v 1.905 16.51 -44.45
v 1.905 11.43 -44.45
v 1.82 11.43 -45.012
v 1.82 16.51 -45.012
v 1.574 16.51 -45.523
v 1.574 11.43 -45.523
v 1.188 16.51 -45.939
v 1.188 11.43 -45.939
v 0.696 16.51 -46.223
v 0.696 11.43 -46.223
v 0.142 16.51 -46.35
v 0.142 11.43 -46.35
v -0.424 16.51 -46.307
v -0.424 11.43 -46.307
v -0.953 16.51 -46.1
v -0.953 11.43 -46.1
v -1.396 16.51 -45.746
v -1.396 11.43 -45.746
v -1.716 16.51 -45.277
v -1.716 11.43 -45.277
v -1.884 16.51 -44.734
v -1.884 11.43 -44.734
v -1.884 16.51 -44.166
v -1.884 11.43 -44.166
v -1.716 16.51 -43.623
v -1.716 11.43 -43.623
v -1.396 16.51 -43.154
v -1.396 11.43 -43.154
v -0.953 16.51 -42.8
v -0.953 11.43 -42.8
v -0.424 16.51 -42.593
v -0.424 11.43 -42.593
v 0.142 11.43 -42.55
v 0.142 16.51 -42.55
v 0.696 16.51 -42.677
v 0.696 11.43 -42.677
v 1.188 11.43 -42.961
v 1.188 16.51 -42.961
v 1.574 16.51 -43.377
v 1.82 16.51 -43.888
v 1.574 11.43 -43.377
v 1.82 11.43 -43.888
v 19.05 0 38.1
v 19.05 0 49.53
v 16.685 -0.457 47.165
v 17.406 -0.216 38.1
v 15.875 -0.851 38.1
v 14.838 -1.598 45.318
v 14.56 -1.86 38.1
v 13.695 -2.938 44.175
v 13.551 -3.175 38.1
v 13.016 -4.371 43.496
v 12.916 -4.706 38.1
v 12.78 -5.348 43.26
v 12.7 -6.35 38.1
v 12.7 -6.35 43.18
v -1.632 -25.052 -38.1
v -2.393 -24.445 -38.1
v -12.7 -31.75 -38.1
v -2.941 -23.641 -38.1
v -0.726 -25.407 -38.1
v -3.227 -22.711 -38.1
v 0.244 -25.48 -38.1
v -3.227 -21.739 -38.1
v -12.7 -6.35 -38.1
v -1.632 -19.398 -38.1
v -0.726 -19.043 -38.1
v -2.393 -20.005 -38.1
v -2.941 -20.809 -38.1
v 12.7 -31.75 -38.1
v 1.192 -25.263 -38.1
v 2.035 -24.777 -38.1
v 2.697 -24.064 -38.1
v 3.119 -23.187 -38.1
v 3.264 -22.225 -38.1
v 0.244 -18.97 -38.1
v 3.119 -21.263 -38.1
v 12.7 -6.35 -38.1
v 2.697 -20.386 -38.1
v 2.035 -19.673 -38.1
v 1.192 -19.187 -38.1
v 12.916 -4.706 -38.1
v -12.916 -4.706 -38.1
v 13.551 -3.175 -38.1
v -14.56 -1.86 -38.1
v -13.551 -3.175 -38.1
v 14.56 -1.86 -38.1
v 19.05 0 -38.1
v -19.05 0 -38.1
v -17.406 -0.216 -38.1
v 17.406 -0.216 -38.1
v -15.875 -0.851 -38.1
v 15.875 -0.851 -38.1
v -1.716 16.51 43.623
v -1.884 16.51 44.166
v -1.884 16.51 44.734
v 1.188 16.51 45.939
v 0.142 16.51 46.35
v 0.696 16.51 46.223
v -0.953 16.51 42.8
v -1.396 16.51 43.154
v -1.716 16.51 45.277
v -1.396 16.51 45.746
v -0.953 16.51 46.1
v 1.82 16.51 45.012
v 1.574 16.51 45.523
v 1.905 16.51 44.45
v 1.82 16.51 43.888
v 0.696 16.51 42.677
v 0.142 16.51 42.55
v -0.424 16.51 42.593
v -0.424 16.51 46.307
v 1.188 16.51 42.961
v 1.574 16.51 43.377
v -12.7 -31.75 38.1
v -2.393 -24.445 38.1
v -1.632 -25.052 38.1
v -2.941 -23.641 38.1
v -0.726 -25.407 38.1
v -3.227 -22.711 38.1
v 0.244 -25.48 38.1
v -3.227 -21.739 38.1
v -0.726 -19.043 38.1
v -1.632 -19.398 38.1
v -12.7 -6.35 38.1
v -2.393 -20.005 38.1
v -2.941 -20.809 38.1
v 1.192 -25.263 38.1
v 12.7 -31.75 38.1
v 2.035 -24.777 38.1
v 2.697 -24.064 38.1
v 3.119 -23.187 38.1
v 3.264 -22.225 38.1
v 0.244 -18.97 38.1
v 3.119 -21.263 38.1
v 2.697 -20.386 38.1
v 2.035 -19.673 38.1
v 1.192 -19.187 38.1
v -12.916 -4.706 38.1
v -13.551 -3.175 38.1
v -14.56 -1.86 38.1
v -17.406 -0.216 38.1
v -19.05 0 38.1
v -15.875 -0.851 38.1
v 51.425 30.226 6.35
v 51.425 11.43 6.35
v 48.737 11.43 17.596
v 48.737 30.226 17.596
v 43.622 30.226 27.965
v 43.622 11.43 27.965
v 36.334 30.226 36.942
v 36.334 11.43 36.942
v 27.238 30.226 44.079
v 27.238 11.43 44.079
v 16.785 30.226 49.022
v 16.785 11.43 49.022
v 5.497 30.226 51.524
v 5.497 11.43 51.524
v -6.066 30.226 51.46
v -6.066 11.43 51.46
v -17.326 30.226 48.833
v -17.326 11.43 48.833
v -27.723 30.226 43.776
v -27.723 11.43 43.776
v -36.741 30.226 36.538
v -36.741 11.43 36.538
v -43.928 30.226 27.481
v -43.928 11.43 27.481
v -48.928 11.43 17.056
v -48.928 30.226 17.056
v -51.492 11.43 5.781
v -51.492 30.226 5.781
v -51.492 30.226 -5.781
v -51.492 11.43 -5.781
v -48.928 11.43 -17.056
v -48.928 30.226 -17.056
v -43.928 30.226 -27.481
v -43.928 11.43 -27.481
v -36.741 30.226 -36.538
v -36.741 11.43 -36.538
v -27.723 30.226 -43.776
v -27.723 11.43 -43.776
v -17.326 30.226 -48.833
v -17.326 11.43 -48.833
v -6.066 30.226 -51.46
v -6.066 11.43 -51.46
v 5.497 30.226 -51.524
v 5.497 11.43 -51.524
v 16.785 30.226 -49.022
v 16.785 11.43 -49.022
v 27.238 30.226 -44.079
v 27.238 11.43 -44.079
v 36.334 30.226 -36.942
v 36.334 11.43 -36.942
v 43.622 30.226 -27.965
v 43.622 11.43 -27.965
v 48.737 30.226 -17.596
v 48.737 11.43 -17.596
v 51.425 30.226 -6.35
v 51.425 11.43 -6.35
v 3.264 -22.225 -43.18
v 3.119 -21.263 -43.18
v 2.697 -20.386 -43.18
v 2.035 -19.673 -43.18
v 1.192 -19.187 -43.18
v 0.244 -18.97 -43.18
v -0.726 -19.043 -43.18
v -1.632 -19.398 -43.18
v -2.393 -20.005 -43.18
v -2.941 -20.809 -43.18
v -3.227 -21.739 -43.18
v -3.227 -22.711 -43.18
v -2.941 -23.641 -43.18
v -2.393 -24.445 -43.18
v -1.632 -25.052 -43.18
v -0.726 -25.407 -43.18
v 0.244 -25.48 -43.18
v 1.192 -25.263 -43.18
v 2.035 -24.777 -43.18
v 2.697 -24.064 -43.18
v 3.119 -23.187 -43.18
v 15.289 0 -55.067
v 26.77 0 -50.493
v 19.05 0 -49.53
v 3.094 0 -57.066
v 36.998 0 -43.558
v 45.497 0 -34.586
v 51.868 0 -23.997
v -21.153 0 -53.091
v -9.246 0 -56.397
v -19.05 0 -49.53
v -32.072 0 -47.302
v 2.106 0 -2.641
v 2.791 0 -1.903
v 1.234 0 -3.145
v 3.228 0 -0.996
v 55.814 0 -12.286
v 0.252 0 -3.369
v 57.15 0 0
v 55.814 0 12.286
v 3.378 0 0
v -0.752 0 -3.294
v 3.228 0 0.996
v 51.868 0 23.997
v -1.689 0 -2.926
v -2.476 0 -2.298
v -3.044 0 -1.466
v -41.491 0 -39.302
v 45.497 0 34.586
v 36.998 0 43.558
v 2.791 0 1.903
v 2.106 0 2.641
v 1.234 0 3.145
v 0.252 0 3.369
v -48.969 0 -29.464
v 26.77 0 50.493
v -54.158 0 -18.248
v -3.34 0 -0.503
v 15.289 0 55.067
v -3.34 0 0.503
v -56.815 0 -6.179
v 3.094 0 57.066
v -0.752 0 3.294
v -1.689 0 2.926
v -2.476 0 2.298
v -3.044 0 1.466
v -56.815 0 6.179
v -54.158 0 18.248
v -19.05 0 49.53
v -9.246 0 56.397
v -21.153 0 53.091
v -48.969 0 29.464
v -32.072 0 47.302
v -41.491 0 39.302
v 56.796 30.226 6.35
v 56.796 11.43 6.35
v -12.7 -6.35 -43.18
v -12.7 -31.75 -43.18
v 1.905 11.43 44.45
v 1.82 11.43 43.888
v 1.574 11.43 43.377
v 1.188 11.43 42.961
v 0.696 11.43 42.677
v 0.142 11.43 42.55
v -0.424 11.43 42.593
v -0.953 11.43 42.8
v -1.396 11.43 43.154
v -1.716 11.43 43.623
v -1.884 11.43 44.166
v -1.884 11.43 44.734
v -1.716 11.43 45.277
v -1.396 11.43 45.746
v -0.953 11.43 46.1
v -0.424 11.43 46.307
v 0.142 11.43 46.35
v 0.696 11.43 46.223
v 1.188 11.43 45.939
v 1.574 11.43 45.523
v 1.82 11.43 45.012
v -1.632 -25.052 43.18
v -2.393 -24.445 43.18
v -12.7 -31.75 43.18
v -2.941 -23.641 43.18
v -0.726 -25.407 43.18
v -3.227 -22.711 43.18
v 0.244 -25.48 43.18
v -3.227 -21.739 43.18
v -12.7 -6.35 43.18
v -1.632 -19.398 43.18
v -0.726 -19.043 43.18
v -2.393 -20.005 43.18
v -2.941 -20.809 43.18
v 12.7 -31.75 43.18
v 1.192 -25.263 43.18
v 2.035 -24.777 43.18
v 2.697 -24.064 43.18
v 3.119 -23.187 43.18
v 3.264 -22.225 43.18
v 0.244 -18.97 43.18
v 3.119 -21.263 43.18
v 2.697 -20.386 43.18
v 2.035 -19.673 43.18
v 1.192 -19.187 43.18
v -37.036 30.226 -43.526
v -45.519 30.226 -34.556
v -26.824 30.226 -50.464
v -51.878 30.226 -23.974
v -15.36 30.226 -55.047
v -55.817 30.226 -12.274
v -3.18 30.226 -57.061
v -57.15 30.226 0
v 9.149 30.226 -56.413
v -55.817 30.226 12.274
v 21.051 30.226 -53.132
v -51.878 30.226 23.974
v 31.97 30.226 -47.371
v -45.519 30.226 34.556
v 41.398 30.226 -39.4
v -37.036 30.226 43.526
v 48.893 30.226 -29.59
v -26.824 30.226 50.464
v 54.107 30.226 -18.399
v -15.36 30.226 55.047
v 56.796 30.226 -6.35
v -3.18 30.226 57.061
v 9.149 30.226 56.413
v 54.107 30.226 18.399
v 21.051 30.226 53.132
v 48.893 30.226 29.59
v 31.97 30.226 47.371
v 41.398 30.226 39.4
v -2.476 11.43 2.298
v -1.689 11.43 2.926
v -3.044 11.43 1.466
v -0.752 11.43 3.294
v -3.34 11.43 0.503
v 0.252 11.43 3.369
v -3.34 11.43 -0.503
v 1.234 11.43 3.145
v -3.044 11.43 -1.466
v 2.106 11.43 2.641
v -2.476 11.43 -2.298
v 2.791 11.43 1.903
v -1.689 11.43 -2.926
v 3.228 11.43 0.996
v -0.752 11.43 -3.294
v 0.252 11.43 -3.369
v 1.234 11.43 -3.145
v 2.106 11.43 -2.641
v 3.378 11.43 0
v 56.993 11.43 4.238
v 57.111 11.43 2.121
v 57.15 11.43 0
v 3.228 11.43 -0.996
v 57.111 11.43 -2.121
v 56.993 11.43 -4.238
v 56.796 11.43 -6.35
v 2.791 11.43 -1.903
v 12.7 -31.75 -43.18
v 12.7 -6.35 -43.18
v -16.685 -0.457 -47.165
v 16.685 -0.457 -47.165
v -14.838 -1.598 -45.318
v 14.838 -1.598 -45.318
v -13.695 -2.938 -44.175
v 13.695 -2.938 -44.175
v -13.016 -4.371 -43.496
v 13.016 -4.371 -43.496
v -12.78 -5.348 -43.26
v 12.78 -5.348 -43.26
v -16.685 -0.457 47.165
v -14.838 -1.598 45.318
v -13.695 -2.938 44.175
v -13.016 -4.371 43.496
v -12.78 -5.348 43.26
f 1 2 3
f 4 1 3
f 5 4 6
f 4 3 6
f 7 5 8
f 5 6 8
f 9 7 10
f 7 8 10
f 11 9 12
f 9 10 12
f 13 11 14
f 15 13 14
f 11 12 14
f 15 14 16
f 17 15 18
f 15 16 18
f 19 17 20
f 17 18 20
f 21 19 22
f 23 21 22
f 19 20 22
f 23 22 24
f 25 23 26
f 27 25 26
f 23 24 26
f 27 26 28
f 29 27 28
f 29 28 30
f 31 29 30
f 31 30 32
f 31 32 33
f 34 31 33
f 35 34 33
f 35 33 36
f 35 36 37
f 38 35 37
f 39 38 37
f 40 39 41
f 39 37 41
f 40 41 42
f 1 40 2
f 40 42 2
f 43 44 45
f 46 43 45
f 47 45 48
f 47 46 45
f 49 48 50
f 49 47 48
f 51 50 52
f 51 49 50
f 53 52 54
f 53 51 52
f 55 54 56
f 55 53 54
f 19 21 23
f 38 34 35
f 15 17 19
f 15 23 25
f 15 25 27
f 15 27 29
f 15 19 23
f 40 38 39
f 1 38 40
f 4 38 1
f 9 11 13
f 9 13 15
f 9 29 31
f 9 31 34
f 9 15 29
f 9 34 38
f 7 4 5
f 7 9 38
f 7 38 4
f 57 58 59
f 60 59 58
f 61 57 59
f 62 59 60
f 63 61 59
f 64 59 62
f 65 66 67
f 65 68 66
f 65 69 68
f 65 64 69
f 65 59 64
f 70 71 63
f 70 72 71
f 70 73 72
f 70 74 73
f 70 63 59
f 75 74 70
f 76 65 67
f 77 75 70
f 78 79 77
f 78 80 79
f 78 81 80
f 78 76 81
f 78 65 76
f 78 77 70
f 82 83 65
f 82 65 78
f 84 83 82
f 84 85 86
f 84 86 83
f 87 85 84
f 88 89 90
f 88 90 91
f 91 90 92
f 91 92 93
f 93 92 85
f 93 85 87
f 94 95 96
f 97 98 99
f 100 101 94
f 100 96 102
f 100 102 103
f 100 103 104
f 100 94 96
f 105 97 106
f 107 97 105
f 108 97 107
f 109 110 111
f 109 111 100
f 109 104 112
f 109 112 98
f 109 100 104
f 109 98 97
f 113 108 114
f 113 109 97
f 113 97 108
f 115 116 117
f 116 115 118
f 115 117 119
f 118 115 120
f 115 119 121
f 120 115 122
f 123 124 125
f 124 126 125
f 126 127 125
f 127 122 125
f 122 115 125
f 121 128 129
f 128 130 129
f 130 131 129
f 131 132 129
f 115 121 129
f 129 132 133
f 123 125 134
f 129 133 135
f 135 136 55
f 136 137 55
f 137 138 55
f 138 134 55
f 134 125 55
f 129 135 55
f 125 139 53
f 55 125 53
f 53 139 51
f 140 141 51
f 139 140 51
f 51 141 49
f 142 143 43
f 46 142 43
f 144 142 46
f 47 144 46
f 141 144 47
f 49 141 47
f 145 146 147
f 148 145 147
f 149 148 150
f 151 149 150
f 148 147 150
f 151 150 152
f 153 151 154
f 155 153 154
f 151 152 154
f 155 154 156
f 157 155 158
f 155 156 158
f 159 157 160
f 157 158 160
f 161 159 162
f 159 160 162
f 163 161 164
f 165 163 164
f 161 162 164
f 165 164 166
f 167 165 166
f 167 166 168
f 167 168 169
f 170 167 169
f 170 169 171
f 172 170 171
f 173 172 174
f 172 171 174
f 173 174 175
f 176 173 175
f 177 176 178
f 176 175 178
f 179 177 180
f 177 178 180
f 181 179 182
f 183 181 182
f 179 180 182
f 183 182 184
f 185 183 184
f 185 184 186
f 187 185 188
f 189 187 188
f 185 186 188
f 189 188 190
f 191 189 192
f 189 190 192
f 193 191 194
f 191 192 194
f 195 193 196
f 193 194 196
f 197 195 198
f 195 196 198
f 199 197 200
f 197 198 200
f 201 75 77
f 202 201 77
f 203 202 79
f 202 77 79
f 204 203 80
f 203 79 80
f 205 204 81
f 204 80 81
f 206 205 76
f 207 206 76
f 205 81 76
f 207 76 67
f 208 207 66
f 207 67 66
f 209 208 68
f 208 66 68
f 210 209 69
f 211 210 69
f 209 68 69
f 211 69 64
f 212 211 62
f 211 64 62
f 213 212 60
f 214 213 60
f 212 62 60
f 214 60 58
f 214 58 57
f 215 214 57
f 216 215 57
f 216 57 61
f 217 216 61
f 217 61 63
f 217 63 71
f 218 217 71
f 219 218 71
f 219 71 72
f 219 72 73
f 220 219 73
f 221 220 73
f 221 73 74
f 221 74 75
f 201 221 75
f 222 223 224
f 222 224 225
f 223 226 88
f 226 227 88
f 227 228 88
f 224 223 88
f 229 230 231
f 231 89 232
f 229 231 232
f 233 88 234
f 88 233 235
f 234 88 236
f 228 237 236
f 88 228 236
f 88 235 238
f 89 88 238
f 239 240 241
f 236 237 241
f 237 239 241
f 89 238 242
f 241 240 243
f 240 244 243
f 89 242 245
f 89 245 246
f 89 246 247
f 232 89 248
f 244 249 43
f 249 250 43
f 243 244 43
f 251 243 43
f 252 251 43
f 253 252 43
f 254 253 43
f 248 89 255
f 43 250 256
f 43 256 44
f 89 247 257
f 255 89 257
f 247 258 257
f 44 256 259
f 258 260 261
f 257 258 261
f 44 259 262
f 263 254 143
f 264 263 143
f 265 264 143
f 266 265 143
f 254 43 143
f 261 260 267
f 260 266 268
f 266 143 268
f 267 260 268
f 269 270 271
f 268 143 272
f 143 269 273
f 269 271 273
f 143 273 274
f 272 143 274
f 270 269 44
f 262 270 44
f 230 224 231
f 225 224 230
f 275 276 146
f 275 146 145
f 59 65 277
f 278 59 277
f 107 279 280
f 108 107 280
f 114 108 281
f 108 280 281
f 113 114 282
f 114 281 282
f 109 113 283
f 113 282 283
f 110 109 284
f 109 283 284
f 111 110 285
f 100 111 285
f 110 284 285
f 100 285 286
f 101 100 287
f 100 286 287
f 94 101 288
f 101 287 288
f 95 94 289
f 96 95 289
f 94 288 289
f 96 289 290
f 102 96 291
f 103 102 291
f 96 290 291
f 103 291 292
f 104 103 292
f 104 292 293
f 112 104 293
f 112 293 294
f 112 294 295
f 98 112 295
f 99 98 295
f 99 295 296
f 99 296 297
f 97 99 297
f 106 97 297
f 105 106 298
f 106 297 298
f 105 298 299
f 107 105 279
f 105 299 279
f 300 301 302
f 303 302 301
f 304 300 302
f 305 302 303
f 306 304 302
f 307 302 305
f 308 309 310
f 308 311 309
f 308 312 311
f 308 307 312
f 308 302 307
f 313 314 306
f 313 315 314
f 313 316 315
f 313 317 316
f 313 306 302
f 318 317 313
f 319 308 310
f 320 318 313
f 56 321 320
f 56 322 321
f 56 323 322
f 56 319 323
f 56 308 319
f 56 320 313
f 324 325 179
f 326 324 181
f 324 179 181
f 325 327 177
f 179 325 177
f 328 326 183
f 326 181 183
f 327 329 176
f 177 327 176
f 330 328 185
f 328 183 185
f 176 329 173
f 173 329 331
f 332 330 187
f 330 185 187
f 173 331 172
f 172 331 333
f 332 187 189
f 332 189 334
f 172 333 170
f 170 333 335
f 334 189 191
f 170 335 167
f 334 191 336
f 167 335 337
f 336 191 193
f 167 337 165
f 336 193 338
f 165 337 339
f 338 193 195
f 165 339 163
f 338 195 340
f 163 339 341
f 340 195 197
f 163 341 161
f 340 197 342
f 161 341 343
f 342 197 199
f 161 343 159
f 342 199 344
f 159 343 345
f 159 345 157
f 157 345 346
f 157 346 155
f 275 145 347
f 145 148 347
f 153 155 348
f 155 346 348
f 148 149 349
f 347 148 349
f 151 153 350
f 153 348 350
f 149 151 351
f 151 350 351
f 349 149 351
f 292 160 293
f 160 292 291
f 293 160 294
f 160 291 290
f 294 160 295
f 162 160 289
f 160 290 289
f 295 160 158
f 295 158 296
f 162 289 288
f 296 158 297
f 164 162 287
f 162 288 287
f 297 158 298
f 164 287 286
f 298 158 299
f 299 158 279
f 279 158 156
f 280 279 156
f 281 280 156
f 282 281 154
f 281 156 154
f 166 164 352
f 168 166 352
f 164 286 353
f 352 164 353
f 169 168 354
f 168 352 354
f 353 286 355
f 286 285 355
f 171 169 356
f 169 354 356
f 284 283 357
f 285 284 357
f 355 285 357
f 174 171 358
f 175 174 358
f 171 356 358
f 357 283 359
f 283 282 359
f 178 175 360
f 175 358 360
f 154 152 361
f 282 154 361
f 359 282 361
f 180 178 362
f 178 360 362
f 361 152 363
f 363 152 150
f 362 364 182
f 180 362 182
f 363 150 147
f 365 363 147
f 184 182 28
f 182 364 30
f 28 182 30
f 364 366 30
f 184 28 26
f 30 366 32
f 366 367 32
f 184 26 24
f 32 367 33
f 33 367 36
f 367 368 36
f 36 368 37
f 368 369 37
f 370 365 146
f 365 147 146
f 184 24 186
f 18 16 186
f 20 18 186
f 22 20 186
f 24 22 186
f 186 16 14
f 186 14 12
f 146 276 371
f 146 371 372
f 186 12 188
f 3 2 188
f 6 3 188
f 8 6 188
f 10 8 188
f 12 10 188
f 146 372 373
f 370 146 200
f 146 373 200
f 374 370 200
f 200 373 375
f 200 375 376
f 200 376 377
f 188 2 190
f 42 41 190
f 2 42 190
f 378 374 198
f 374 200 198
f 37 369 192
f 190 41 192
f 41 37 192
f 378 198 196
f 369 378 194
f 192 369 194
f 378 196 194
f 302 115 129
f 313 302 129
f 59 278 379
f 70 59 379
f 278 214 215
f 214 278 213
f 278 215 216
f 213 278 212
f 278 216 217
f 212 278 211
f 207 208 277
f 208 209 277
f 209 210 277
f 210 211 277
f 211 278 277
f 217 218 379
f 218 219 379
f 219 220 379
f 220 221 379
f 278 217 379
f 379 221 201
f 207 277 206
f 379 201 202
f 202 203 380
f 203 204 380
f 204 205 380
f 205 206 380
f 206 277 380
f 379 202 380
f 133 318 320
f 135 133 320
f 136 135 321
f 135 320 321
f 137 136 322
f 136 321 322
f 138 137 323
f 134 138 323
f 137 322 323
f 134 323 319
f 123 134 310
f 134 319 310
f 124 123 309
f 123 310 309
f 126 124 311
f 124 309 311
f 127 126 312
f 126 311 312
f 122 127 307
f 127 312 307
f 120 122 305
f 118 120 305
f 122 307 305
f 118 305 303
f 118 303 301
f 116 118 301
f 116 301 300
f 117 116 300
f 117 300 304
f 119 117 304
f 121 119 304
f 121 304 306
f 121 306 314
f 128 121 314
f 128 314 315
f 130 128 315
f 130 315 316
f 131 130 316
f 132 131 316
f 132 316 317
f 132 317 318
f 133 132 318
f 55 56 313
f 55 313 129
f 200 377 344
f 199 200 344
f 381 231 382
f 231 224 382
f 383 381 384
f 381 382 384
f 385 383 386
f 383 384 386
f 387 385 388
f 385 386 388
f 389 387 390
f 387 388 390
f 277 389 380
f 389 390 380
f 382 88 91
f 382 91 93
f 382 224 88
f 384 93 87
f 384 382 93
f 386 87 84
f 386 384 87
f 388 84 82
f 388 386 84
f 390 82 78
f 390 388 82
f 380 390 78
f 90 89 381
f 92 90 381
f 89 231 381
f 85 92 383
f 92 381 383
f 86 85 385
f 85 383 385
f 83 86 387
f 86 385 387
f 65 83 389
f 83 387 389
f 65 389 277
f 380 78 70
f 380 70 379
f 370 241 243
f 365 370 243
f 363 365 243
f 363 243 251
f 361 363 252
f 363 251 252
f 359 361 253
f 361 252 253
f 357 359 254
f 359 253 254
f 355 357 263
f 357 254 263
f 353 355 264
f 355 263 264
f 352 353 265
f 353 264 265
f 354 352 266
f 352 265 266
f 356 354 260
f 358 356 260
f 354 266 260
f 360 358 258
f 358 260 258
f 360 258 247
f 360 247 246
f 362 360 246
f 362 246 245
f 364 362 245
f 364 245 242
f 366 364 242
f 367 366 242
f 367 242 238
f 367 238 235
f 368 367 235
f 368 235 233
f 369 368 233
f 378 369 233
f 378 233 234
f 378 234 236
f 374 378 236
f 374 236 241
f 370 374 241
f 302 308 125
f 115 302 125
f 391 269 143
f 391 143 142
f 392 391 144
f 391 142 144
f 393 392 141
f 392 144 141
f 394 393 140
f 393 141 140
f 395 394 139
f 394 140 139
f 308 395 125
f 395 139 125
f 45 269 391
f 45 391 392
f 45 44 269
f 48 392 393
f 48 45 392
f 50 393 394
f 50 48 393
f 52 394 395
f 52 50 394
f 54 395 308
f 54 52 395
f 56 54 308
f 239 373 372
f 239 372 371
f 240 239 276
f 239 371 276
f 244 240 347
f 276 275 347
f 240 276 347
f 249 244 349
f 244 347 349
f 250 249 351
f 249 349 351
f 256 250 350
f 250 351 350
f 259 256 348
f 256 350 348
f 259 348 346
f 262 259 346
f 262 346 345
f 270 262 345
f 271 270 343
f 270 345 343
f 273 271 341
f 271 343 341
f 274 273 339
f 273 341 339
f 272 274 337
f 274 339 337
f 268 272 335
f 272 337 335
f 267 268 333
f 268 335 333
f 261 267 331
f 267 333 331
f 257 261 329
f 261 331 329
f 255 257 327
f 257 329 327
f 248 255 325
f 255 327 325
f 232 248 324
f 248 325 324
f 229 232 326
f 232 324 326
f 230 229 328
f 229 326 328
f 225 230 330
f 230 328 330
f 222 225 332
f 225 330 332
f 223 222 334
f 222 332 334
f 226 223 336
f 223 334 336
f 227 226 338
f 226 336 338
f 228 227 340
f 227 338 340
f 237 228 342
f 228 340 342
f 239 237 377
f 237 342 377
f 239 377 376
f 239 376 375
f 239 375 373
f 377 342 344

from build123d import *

# Parameters (mm, degrees)
REVOLVE1_ANGLE          = 360
CUT_EXTRUDE2_REACH      = 116.3
SKETCH4_W               = 12.7
SKETCH4_H               = 18.796
SKETCH5_R               = 3.3782
CUT_EXTRUDE3_DEPTH      = 31.226
SKETCH6_R               = 1.905
BOSS_EXTRUDE1_DEPTH     = 5.08
SKETCH7_W               = 25.4
SKETCH7_H               = 5.08
BOSS_EXTRUDE4_DEPTH     = 31.75
FILLET1_R               = 6.35
SKETCH8_R               = 3.2639
CUT_EXTRUDE4_DEPTH      = 14.97
CUT_EXTRUDE4_DEPTH_BACK = 101.33


with BuildPart() as part:
    # Sketch1 → Revolve1 (revolve, symmetric)
    with BuildSketch(Plane.XY) as revolve1_sk:
        Polygon((0, 0), (57.15, 0), (57.15, 30.226), (51.816, 30.226), (51.816, 11.43), (0, 11.43), align=None)
    revolve(axis=Axis((0, 0, 0), (0, 1, 0)), revolution_arc=REVOLVE1_ANGLE / 2)
    revolve(revolve1_sk.sketch, axis=Axis((0, 0, 0), (0, -1, 0)), revolution_arc=REVOLVE1_ANGLE / 2)

    # Sketch4 → Cut-Extrude2 (cut, up to next)
    with BuildSketch(Plane(origin=(57.15, 0, 0), x_dir=(0, 0, -1), z_dir=(1, 0, 0)), mode=Mode.PRIVATE) as cut_extrude2_sk1:
        with Locations((0, 20.828)):
            Rectangle(SKETCH4_W, SKETCH4_H)
    cut_extrude2_tool1 = extrude(cut_extrude2_sk1.sketch, amount=-CUT_EXTRUDE2_REACH, mode=Mode.PRIVATE) & part.part
    add(cut_extrude2_tool1.solids().sort_by_distance((57.15, 20.828, 0))[0], mode=Mode.SUBTRACT)

    # Sketch5 → Cut-Extrude3 (cut, through all)
    with BuildSketch(Plane.XZ):
        Circle(SKETCH5_R)
    extrude(amount=-CUT_EXTRUDE3_DEPTH, mode=Mode.SUBTRACT)

    # Sketch6 → Boss-Extrude1 (add)
    with BuildSketch(Plane(origin=(0, 11.43, 0), x_dir=(1, 0, 0), z_dir=(0, 1, 0))):
        with Locations((0, 44.45)):
            Circle(SKETCH6_R)
        with Locations((0, -44.45)):
            Circle(SKETCH6_R)
    extrude(amount=BOSS_EXTRUDE1_DEPTH)

    # Sketch7 → Boss-Extrude4 (add)
    with BuildSketch(Plane(origin=(0, 0, 0), x_dir=(1, 0, 0), z_dir=(0, 1, 0))):
        with Locations((0, -40.64)):
            Rectangle(SKETCH7_W, SKETCH7_H)
        with Locations((0, 40.64)):
            Rectangle(SKETCH7_W, SKETCH7_H)
    extrude(amount=-BOSS_EXTRUDE4_DEPTH)

    # Fillet1
    fillet1_edges = [part.edges().sort_by_distance(p)[0] for p in [
        (12.7, 0, 40.64),
        (-12.7, 0, 40.64),
        (0, 0, 43.18),
        (-12.7, 0, -40.64),
        (12.7, 0, -40.64),
        (0, 0, -43.18),
    ]]
    fillet(fillet1_edges, radius=FILLET1_R)

    # Sketch8 → Cut-Extrude4 (cut, two sides)
    with BuildSketch(Plane.XY.offset(43.18)) as cut_extrude4_sk:
        with Locations((0, -22.225)):
            Circle(SKETCH8_R)
    extrude(amount=CUT_EXTRUDE4_DEPTH, mode=Mode.SUBTRACT)
    extrude(cut_extrude4_sk.sketch, amount=-CUT_EXTRUDE4_DEPTH_BACK, mode=Mode.SUBTRACT)


solid = part.part
